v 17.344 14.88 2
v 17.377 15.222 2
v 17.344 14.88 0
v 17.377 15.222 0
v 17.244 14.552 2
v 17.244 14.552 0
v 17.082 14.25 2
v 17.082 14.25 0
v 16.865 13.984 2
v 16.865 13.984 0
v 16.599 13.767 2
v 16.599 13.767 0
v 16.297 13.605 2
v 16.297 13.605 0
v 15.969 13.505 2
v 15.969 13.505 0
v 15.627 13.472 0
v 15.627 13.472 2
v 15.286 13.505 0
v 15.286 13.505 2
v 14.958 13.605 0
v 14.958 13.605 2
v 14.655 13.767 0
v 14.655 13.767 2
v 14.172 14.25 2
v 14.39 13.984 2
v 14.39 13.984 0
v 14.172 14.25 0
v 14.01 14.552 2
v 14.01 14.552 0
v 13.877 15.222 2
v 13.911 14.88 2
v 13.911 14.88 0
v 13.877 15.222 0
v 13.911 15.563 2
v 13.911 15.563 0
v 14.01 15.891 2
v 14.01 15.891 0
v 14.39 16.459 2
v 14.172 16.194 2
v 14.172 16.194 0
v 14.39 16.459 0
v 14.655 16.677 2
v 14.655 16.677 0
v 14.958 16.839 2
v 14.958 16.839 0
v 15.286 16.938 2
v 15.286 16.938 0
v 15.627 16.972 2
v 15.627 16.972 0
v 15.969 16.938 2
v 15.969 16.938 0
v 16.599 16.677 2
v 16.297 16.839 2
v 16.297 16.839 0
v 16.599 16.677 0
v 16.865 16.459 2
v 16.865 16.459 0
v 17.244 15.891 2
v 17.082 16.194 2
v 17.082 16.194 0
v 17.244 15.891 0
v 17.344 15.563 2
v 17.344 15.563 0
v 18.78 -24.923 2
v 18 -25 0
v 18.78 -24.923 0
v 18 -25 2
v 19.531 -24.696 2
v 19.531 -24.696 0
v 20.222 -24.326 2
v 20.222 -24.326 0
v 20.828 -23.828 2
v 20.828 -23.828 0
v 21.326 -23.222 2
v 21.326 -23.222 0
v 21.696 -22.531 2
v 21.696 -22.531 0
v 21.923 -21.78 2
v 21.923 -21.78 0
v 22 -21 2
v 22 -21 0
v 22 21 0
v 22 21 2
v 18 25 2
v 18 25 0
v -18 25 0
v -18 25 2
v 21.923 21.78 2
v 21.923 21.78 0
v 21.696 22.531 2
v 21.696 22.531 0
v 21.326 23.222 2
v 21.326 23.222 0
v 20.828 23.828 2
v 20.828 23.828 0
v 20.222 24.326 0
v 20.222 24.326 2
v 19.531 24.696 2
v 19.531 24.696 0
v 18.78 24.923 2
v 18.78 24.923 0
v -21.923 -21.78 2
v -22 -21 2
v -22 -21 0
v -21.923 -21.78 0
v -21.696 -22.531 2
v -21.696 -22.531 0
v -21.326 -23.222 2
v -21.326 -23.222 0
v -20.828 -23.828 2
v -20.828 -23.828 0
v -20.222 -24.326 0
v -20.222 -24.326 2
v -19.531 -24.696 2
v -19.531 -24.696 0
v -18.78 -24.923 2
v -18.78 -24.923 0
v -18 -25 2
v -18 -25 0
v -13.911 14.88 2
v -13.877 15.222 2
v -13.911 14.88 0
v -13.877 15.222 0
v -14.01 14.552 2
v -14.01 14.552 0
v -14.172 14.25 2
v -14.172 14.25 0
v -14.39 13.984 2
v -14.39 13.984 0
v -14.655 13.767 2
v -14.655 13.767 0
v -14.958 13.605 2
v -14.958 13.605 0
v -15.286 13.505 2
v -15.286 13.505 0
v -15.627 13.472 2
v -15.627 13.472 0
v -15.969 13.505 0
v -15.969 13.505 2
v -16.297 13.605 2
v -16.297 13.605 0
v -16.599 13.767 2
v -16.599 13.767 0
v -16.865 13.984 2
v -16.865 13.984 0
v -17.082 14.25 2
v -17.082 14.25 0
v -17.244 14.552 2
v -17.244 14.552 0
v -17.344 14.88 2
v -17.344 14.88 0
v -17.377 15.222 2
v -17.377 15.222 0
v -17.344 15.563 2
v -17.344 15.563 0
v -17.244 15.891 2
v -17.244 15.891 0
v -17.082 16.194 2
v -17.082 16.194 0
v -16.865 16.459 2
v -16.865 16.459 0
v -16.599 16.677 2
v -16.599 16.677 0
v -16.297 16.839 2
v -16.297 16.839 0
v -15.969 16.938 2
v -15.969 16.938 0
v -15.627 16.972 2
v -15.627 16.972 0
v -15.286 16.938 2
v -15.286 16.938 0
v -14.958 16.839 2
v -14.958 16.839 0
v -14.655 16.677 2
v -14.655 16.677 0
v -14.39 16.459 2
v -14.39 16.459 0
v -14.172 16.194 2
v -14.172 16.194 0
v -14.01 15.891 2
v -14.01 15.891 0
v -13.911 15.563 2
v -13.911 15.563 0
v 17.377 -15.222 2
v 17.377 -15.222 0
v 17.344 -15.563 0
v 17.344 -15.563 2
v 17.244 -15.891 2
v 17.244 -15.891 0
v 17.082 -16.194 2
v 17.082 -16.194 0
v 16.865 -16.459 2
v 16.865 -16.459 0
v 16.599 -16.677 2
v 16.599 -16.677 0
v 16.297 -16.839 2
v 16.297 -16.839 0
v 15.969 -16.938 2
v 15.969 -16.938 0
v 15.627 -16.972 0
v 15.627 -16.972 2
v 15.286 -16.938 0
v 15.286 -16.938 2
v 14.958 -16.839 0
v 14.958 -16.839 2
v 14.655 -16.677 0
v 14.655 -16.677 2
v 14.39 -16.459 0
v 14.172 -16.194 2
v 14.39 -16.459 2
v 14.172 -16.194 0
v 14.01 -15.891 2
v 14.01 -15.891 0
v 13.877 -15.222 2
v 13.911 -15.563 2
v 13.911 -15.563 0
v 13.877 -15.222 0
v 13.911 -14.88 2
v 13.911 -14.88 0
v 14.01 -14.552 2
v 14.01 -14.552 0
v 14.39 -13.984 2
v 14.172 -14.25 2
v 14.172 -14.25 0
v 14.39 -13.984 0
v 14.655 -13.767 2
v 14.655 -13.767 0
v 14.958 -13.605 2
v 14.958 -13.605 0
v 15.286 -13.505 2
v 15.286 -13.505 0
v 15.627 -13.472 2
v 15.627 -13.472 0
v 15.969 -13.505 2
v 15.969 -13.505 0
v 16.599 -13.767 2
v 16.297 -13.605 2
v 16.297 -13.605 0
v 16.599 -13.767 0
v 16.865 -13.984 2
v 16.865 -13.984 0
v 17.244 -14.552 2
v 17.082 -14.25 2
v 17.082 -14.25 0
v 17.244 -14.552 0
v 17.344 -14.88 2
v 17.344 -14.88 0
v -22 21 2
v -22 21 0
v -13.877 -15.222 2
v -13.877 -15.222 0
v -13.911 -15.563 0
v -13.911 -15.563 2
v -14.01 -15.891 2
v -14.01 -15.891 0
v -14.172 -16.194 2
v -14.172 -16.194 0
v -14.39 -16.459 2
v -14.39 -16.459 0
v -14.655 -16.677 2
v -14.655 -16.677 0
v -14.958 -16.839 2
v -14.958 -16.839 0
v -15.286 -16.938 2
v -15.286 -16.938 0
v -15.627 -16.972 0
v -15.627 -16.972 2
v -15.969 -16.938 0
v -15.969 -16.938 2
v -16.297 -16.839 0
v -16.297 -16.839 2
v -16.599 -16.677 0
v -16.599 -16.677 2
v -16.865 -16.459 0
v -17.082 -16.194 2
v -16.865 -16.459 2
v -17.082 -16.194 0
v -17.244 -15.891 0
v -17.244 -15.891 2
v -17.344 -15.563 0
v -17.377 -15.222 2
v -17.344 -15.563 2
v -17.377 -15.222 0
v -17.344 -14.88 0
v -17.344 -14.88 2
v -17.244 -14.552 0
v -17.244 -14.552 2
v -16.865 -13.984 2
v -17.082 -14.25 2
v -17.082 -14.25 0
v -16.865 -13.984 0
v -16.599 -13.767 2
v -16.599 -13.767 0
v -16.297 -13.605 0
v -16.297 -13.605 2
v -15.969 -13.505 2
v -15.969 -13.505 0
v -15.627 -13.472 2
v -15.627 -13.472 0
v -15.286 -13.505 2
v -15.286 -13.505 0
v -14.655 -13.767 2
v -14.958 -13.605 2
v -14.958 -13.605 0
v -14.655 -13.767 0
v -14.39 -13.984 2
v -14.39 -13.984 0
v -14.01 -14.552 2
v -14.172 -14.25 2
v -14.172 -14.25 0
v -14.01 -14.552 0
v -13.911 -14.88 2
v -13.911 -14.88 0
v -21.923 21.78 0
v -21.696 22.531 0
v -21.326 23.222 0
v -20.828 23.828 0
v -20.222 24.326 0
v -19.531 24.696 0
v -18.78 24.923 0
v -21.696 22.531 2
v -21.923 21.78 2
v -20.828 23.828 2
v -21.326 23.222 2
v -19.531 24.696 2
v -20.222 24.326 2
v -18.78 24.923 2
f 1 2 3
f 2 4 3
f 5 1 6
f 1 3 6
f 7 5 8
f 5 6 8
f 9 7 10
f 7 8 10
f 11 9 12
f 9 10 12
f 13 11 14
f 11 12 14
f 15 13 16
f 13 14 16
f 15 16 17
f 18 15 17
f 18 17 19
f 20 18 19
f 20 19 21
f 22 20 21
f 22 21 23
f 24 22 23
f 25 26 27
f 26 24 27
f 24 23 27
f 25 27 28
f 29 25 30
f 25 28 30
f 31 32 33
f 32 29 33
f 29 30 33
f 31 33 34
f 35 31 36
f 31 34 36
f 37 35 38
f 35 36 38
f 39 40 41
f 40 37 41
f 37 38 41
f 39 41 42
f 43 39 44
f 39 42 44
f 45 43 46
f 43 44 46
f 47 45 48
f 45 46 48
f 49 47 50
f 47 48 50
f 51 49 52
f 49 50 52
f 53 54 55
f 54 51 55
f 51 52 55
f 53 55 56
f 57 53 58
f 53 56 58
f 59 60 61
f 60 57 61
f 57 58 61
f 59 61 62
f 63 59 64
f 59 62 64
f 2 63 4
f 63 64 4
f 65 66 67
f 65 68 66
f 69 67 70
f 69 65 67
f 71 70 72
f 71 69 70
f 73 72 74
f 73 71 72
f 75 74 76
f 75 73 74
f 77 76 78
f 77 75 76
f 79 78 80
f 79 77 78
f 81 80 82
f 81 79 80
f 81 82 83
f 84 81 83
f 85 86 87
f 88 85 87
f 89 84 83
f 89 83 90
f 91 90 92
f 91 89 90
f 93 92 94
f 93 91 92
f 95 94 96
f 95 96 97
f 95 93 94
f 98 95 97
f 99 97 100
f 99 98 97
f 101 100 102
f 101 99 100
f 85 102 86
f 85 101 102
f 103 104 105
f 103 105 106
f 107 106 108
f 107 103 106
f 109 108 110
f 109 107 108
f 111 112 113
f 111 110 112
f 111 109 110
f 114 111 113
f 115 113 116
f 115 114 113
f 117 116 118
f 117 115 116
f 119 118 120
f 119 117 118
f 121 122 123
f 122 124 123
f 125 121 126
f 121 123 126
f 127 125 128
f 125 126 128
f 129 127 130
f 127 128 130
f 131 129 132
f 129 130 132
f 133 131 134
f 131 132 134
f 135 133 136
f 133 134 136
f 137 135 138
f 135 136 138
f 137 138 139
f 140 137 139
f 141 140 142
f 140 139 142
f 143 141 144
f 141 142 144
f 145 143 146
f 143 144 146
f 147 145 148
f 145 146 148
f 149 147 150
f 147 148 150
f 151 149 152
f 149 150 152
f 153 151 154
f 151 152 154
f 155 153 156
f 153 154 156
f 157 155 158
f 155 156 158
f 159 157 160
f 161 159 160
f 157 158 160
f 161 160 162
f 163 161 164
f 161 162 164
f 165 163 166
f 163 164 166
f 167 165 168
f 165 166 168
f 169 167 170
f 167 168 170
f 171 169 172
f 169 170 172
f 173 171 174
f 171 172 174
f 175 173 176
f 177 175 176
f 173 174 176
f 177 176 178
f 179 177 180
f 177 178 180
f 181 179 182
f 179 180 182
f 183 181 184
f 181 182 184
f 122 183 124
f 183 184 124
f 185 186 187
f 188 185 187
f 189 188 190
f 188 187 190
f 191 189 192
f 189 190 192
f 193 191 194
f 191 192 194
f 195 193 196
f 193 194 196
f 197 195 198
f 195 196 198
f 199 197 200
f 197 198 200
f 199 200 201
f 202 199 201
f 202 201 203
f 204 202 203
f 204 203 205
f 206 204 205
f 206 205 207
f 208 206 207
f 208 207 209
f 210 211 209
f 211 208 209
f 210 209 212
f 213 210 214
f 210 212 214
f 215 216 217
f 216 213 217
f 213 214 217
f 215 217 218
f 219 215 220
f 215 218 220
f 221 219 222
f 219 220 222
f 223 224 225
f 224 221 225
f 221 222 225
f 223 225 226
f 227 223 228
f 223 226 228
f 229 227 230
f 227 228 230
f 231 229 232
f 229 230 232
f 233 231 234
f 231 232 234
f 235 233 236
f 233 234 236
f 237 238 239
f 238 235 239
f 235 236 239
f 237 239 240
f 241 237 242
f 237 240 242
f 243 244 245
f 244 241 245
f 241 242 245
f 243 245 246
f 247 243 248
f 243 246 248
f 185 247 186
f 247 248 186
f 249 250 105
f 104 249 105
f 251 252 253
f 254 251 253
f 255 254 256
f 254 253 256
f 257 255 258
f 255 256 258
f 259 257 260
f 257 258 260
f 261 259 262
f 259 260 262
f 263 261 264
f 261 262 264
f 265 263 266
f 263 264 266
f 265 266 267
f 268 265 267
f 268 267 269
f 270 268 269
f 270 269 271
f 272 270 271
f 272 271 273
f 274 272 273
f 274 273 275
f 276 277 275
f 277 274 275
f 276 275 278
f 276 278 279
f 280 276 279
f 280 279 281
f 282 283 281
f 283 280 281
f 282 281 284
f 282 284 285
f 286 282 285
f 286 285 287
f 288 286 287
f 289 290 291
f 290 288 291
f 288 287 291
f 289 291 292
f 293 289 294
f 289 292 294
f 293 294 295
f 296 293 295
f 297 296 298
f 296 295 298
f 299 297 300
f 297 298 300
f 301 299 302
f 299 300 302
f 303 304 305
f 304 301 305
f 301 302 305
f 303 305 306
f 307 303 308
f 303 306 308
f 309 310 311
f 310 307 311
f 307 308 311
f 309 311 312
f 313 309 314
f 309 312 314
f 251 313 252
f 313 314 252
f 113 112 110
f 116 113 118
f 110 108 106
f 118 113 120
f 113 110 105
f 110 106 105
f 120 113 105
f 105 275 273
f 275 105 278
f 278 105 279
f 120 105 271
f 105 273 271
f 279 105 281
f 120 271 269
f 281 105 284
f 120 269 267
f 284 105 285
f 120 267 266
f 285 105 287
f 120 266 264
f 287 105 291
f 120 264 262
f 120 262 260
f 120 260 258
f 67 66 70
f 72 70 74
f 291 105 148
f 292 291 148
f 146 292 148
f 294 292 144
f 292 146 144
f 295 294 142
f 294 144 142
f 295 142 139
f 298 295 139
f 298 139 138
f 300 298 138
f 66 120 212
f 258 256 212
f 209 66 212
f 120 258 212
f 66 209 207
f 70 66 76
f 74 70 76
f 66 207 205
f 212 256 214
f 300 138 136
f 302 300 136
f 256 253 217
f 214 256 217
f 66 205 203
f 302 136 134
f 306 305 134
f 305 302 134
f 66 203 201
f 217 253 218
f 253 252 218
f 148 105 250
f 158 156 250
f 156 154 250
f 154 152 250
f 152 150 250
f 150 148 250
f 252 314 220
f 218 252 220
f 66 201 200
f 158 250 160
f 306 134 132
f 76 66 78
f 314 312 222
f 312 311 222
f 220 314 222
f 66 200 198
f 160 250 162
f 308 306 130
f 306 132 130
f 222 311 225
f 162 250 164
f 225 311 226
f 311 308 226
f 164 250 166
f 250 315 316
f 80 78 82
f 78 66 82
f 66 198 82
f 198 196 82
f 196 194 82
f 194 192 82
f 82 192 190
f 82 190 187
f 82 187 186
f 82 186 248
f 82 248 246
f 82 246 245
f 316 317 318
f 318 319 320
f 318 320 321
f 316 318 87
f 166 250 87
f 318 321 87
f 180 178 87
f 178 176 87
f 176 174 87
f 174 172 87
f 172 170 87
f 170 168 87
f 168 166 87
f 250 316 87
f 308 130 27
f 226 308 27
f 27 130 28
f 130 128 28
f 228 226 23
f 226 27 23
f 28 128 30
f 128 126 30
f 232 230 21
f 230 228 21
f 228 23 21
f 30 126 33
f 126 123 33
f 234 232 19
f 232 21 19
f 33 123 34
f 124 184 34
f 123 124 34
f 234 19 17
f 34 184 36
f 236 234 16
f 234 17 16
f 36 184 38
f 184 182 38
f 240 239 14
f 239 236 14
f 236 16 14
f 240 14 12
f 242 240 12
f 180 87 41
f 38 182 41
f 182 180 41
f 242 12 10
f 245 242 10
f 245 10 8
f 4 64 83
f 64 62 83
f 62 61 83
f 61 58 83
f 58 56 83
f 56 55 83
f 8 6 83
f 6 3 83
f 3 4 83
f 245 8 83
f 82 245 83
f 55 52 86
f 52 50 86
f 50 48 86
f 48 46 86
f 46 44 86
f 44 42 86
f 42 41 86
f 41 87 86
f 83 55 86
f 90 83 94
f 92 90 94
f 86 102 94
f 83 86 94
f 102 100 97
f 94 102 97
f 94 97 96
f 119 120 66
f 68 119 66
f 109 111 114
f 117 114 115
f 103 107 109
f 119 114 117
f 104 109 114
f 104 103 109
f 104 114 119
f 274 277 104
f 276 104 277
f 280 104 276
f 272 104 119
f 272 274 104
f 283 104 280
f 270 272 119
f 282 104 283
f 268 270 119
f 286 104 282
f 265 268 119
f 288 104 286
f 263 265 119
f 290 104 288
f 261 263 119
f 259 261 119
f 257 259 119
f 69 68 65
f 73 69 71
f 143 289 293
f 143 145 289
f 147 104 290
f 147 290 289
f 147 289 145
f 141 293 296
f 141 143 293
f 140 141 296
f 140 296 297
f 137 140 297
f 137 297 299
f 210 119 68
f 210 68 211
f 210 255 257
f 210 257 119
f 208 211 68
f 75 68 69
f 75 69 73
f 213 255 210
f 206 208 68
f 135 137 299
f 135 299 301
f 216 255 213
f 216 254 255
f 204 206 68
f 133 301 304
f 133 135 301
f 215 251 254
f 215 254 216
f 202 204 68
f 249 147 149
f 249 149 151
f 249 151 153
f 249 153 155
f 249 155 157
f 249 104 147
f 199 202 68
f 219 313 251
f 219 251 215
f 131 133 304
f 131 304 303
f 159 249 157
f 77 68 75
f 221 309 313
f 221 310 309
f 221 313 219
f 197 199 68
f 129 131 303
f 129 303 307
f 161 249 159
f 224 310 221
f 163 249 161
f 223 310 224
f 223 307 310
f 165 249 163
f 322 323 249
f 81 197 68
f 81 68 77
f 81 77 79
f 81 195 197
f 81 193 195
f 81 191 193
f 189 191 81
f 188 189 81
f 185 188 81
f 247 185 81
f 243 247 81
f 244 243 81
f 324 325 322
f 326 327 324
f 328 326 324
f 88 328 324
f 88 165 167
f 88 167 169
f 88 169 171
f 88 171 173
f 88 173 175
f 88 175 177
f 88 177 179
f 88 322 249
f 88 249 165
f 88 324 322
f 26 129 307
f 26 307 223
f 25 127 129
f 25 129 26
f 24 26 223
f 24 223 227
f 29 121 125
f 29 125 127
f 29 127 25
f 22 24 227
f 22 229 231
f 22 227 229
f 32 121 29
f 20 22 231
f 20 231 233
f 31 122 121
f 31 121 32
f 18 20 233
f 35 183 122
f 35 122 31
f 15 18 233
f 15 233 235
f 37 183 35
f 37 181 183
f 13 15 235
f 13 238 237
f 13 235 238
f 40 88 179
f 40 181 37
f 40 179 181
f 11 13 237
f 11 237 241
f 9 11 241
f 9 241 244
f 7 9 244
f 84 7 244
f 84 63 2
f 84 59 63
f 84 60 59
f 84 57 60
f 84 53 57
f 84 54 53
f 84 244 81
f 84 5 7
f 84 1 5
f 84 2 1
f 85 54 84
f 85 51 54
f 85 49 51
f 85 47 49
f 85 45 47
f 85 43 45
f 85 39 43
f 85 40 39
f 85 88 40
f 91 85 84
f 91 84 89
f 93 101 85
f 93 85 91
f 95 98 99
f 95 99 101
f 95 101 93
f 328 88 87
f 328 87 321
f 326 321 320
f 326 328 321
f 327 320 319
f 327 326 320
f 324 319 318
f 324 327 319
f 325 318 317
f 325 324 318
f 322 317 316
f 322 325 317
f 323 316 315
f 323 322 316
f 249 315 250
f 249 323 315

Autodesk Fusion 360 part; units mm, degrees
sketch "Sketch1" plane through (0, 0, 0) normal (0, 0, 1) x (1, 0, 0)
  line L0 (22, 25) -> (-22, 25)
  line L1 (-22, 25) -> (-22, -25)
  line L2 (-22, -25) -> (22, -25)
  line L3 (22, -25) -> (22, 25)
  line L4 (22, 25) -> (-22, -25) construction
  line L5 (-22, 25) -> (22, -25) construction
  line L6 (18.6, 18.6) -> (-18.6, 18.6)
  line L7 (-18.6, 18.6) -> (-18.6, -18.6)
  line L8 (-18.6, -18.6) -> (18.6, -18.6)
  line L9 (18.6, -18.6) -> (18.6, 18.6)
  line L10 (18.6, 18.6) -> (-18.6, -18.6) construction
  line L11 (-18.6, 18.6) -> (18.6, -18.6) construction
  line L12 (-18.6, 18.6) -> (-15.6272, 15.2218)
  circle A0 centre (-15.6272, 15.2218) radius 1.75
  line L13 (0, -25) -> (0, 25)
  line L14 (22, 0) -> (-22, 0)
  circle A1 centre (-15.6272, -15.2218) radius 1.75
  circle A2 centre (15.6272, -15.2218) radius 1.75
  circle A3 centre (15.6272, 15.2218) radius 1.75
  line L15 (-15.6272, 15.2218) -> (-18.6, 15.2218)
  line L16 (-18.6, 15.2218) -> (-22, 15.2218)
  line L17 (-18.8272, 15.2218) -> (-17.2272, 12.4505)
  line L18 (-17.2272, 12.4505) -> (-14.0272, 12.4505)
  line L19 (-14.0272, 12.4505) -> (-12.4272, 15.2218)
  line L20 (-12.4272, 15.2218) -> (-14.0272, 17.9931)
  line L21 (-14.0272, 17.9931) -> (-17.2272, 17.9931)
  line L22 (-17.2272, 17.9931) -> (-18.8272, 15.2218)
  line L23 (14.0272, 12.4505) -> (12.4272, 15.2218)
  line L24 (12.4272, 15.2218) -> (14.0272, 17.9931)
  line L25 (14.0272, 17.9931) -> (17.2272, 17.9931)
  line L26 (17.2272, 17.9931) -> (18.8272, 15.2218)
  line L27 (18.8272, 15.2218) -> (17.2272, 12.4505)
  line L28 (17.2272, 12.4505) -> (14.0272, 12.4505)
  line L29 (-14.0272, -17.9931) -> (-17.2272, -17.9931)
  line L30 (-17.2272, -17.9931) -> (-18.8272, -15.2218)
  line L31 (-12.4272, -15.2218) -> (-14.0272, -17.9931)
  line L32 (-14.0272, -12.4505) -> (-12.4272, -15.2218)
  line L33 (-17.2272, -12.4505) -> (-14.0272, -12.4505)
  line L34 (-18.8272, -15.2218) -> (-17.2272, -12.4505)
  line L35 (18.8272, -15.2218) -> (17.2272, -12.4505)
  line L36 (17.2272, -17.9931) -> (18.8272, -15.2218)
  line L37 (14.0272, -17.9931) -> (17.2272, -17.9931)
  line L38 (12.4272, -15.2218) -> (14.0272, -17.9931)
  line L39 (14.0272, -12.4505) -> (12.4272, -15.2218)
  line L40 (17.2272, -12.4505) -> (14.0272, -12.4505)
  point P0 (-15.6272, 15.2218)
  dimension "d1" = 44
  dimension "d2" = 50
  dimension "d3" = 37.2
  dimension "d4" = 37.2
  dimension "d5" = 4.5
  dimension "d6" = 3.5
  dimension "d11" = 3.2
extrude "Extrude1" add sketch "Sketch1" along normal blind 2 contours L0 L3 L6 L9 L13 L14 L26 L27 | L0 L1 L6 L7 L13 L16 L22 | L2 L3 L8 L9 L13 L14 L35 L36 | L6 L7 L12 L13 L14 L17 L18 L19 L20 L21 L22 | L6 L9 L13 L14 L23 L24 L25 L26 L27 L28 | L8 L9 L13 L14 L35 L36 L37 L38 L39 L40 | L1 L7 L14 L16 L17 | L7 L12 L22 | L7 L8 L13 L14 L29 L30 L31 L32 L33 L34 | L1 L2 L7 L8 L13 L14 L30 L34 | L9 L35 L36 | L9 L35 L36 L37 L38 L39 L40 | L9 L23 L24 L25 L26 L27 L28 | L9 L26 L27 | L7 L16 L22 | L7 L16 L17 | L7 L12 A0 L15 L22 | L7 L12 A0 L15 L17 L18 L19 L20 L21 L22 | L7 L29 L30 L31 L32 L33 L34 | L7 L30 L34
fillet "Fillet1" radius 4 4 edges at (22, -25, 1) (-22, -25, 1) (-22, 25, 1) (22, 25, 1)
